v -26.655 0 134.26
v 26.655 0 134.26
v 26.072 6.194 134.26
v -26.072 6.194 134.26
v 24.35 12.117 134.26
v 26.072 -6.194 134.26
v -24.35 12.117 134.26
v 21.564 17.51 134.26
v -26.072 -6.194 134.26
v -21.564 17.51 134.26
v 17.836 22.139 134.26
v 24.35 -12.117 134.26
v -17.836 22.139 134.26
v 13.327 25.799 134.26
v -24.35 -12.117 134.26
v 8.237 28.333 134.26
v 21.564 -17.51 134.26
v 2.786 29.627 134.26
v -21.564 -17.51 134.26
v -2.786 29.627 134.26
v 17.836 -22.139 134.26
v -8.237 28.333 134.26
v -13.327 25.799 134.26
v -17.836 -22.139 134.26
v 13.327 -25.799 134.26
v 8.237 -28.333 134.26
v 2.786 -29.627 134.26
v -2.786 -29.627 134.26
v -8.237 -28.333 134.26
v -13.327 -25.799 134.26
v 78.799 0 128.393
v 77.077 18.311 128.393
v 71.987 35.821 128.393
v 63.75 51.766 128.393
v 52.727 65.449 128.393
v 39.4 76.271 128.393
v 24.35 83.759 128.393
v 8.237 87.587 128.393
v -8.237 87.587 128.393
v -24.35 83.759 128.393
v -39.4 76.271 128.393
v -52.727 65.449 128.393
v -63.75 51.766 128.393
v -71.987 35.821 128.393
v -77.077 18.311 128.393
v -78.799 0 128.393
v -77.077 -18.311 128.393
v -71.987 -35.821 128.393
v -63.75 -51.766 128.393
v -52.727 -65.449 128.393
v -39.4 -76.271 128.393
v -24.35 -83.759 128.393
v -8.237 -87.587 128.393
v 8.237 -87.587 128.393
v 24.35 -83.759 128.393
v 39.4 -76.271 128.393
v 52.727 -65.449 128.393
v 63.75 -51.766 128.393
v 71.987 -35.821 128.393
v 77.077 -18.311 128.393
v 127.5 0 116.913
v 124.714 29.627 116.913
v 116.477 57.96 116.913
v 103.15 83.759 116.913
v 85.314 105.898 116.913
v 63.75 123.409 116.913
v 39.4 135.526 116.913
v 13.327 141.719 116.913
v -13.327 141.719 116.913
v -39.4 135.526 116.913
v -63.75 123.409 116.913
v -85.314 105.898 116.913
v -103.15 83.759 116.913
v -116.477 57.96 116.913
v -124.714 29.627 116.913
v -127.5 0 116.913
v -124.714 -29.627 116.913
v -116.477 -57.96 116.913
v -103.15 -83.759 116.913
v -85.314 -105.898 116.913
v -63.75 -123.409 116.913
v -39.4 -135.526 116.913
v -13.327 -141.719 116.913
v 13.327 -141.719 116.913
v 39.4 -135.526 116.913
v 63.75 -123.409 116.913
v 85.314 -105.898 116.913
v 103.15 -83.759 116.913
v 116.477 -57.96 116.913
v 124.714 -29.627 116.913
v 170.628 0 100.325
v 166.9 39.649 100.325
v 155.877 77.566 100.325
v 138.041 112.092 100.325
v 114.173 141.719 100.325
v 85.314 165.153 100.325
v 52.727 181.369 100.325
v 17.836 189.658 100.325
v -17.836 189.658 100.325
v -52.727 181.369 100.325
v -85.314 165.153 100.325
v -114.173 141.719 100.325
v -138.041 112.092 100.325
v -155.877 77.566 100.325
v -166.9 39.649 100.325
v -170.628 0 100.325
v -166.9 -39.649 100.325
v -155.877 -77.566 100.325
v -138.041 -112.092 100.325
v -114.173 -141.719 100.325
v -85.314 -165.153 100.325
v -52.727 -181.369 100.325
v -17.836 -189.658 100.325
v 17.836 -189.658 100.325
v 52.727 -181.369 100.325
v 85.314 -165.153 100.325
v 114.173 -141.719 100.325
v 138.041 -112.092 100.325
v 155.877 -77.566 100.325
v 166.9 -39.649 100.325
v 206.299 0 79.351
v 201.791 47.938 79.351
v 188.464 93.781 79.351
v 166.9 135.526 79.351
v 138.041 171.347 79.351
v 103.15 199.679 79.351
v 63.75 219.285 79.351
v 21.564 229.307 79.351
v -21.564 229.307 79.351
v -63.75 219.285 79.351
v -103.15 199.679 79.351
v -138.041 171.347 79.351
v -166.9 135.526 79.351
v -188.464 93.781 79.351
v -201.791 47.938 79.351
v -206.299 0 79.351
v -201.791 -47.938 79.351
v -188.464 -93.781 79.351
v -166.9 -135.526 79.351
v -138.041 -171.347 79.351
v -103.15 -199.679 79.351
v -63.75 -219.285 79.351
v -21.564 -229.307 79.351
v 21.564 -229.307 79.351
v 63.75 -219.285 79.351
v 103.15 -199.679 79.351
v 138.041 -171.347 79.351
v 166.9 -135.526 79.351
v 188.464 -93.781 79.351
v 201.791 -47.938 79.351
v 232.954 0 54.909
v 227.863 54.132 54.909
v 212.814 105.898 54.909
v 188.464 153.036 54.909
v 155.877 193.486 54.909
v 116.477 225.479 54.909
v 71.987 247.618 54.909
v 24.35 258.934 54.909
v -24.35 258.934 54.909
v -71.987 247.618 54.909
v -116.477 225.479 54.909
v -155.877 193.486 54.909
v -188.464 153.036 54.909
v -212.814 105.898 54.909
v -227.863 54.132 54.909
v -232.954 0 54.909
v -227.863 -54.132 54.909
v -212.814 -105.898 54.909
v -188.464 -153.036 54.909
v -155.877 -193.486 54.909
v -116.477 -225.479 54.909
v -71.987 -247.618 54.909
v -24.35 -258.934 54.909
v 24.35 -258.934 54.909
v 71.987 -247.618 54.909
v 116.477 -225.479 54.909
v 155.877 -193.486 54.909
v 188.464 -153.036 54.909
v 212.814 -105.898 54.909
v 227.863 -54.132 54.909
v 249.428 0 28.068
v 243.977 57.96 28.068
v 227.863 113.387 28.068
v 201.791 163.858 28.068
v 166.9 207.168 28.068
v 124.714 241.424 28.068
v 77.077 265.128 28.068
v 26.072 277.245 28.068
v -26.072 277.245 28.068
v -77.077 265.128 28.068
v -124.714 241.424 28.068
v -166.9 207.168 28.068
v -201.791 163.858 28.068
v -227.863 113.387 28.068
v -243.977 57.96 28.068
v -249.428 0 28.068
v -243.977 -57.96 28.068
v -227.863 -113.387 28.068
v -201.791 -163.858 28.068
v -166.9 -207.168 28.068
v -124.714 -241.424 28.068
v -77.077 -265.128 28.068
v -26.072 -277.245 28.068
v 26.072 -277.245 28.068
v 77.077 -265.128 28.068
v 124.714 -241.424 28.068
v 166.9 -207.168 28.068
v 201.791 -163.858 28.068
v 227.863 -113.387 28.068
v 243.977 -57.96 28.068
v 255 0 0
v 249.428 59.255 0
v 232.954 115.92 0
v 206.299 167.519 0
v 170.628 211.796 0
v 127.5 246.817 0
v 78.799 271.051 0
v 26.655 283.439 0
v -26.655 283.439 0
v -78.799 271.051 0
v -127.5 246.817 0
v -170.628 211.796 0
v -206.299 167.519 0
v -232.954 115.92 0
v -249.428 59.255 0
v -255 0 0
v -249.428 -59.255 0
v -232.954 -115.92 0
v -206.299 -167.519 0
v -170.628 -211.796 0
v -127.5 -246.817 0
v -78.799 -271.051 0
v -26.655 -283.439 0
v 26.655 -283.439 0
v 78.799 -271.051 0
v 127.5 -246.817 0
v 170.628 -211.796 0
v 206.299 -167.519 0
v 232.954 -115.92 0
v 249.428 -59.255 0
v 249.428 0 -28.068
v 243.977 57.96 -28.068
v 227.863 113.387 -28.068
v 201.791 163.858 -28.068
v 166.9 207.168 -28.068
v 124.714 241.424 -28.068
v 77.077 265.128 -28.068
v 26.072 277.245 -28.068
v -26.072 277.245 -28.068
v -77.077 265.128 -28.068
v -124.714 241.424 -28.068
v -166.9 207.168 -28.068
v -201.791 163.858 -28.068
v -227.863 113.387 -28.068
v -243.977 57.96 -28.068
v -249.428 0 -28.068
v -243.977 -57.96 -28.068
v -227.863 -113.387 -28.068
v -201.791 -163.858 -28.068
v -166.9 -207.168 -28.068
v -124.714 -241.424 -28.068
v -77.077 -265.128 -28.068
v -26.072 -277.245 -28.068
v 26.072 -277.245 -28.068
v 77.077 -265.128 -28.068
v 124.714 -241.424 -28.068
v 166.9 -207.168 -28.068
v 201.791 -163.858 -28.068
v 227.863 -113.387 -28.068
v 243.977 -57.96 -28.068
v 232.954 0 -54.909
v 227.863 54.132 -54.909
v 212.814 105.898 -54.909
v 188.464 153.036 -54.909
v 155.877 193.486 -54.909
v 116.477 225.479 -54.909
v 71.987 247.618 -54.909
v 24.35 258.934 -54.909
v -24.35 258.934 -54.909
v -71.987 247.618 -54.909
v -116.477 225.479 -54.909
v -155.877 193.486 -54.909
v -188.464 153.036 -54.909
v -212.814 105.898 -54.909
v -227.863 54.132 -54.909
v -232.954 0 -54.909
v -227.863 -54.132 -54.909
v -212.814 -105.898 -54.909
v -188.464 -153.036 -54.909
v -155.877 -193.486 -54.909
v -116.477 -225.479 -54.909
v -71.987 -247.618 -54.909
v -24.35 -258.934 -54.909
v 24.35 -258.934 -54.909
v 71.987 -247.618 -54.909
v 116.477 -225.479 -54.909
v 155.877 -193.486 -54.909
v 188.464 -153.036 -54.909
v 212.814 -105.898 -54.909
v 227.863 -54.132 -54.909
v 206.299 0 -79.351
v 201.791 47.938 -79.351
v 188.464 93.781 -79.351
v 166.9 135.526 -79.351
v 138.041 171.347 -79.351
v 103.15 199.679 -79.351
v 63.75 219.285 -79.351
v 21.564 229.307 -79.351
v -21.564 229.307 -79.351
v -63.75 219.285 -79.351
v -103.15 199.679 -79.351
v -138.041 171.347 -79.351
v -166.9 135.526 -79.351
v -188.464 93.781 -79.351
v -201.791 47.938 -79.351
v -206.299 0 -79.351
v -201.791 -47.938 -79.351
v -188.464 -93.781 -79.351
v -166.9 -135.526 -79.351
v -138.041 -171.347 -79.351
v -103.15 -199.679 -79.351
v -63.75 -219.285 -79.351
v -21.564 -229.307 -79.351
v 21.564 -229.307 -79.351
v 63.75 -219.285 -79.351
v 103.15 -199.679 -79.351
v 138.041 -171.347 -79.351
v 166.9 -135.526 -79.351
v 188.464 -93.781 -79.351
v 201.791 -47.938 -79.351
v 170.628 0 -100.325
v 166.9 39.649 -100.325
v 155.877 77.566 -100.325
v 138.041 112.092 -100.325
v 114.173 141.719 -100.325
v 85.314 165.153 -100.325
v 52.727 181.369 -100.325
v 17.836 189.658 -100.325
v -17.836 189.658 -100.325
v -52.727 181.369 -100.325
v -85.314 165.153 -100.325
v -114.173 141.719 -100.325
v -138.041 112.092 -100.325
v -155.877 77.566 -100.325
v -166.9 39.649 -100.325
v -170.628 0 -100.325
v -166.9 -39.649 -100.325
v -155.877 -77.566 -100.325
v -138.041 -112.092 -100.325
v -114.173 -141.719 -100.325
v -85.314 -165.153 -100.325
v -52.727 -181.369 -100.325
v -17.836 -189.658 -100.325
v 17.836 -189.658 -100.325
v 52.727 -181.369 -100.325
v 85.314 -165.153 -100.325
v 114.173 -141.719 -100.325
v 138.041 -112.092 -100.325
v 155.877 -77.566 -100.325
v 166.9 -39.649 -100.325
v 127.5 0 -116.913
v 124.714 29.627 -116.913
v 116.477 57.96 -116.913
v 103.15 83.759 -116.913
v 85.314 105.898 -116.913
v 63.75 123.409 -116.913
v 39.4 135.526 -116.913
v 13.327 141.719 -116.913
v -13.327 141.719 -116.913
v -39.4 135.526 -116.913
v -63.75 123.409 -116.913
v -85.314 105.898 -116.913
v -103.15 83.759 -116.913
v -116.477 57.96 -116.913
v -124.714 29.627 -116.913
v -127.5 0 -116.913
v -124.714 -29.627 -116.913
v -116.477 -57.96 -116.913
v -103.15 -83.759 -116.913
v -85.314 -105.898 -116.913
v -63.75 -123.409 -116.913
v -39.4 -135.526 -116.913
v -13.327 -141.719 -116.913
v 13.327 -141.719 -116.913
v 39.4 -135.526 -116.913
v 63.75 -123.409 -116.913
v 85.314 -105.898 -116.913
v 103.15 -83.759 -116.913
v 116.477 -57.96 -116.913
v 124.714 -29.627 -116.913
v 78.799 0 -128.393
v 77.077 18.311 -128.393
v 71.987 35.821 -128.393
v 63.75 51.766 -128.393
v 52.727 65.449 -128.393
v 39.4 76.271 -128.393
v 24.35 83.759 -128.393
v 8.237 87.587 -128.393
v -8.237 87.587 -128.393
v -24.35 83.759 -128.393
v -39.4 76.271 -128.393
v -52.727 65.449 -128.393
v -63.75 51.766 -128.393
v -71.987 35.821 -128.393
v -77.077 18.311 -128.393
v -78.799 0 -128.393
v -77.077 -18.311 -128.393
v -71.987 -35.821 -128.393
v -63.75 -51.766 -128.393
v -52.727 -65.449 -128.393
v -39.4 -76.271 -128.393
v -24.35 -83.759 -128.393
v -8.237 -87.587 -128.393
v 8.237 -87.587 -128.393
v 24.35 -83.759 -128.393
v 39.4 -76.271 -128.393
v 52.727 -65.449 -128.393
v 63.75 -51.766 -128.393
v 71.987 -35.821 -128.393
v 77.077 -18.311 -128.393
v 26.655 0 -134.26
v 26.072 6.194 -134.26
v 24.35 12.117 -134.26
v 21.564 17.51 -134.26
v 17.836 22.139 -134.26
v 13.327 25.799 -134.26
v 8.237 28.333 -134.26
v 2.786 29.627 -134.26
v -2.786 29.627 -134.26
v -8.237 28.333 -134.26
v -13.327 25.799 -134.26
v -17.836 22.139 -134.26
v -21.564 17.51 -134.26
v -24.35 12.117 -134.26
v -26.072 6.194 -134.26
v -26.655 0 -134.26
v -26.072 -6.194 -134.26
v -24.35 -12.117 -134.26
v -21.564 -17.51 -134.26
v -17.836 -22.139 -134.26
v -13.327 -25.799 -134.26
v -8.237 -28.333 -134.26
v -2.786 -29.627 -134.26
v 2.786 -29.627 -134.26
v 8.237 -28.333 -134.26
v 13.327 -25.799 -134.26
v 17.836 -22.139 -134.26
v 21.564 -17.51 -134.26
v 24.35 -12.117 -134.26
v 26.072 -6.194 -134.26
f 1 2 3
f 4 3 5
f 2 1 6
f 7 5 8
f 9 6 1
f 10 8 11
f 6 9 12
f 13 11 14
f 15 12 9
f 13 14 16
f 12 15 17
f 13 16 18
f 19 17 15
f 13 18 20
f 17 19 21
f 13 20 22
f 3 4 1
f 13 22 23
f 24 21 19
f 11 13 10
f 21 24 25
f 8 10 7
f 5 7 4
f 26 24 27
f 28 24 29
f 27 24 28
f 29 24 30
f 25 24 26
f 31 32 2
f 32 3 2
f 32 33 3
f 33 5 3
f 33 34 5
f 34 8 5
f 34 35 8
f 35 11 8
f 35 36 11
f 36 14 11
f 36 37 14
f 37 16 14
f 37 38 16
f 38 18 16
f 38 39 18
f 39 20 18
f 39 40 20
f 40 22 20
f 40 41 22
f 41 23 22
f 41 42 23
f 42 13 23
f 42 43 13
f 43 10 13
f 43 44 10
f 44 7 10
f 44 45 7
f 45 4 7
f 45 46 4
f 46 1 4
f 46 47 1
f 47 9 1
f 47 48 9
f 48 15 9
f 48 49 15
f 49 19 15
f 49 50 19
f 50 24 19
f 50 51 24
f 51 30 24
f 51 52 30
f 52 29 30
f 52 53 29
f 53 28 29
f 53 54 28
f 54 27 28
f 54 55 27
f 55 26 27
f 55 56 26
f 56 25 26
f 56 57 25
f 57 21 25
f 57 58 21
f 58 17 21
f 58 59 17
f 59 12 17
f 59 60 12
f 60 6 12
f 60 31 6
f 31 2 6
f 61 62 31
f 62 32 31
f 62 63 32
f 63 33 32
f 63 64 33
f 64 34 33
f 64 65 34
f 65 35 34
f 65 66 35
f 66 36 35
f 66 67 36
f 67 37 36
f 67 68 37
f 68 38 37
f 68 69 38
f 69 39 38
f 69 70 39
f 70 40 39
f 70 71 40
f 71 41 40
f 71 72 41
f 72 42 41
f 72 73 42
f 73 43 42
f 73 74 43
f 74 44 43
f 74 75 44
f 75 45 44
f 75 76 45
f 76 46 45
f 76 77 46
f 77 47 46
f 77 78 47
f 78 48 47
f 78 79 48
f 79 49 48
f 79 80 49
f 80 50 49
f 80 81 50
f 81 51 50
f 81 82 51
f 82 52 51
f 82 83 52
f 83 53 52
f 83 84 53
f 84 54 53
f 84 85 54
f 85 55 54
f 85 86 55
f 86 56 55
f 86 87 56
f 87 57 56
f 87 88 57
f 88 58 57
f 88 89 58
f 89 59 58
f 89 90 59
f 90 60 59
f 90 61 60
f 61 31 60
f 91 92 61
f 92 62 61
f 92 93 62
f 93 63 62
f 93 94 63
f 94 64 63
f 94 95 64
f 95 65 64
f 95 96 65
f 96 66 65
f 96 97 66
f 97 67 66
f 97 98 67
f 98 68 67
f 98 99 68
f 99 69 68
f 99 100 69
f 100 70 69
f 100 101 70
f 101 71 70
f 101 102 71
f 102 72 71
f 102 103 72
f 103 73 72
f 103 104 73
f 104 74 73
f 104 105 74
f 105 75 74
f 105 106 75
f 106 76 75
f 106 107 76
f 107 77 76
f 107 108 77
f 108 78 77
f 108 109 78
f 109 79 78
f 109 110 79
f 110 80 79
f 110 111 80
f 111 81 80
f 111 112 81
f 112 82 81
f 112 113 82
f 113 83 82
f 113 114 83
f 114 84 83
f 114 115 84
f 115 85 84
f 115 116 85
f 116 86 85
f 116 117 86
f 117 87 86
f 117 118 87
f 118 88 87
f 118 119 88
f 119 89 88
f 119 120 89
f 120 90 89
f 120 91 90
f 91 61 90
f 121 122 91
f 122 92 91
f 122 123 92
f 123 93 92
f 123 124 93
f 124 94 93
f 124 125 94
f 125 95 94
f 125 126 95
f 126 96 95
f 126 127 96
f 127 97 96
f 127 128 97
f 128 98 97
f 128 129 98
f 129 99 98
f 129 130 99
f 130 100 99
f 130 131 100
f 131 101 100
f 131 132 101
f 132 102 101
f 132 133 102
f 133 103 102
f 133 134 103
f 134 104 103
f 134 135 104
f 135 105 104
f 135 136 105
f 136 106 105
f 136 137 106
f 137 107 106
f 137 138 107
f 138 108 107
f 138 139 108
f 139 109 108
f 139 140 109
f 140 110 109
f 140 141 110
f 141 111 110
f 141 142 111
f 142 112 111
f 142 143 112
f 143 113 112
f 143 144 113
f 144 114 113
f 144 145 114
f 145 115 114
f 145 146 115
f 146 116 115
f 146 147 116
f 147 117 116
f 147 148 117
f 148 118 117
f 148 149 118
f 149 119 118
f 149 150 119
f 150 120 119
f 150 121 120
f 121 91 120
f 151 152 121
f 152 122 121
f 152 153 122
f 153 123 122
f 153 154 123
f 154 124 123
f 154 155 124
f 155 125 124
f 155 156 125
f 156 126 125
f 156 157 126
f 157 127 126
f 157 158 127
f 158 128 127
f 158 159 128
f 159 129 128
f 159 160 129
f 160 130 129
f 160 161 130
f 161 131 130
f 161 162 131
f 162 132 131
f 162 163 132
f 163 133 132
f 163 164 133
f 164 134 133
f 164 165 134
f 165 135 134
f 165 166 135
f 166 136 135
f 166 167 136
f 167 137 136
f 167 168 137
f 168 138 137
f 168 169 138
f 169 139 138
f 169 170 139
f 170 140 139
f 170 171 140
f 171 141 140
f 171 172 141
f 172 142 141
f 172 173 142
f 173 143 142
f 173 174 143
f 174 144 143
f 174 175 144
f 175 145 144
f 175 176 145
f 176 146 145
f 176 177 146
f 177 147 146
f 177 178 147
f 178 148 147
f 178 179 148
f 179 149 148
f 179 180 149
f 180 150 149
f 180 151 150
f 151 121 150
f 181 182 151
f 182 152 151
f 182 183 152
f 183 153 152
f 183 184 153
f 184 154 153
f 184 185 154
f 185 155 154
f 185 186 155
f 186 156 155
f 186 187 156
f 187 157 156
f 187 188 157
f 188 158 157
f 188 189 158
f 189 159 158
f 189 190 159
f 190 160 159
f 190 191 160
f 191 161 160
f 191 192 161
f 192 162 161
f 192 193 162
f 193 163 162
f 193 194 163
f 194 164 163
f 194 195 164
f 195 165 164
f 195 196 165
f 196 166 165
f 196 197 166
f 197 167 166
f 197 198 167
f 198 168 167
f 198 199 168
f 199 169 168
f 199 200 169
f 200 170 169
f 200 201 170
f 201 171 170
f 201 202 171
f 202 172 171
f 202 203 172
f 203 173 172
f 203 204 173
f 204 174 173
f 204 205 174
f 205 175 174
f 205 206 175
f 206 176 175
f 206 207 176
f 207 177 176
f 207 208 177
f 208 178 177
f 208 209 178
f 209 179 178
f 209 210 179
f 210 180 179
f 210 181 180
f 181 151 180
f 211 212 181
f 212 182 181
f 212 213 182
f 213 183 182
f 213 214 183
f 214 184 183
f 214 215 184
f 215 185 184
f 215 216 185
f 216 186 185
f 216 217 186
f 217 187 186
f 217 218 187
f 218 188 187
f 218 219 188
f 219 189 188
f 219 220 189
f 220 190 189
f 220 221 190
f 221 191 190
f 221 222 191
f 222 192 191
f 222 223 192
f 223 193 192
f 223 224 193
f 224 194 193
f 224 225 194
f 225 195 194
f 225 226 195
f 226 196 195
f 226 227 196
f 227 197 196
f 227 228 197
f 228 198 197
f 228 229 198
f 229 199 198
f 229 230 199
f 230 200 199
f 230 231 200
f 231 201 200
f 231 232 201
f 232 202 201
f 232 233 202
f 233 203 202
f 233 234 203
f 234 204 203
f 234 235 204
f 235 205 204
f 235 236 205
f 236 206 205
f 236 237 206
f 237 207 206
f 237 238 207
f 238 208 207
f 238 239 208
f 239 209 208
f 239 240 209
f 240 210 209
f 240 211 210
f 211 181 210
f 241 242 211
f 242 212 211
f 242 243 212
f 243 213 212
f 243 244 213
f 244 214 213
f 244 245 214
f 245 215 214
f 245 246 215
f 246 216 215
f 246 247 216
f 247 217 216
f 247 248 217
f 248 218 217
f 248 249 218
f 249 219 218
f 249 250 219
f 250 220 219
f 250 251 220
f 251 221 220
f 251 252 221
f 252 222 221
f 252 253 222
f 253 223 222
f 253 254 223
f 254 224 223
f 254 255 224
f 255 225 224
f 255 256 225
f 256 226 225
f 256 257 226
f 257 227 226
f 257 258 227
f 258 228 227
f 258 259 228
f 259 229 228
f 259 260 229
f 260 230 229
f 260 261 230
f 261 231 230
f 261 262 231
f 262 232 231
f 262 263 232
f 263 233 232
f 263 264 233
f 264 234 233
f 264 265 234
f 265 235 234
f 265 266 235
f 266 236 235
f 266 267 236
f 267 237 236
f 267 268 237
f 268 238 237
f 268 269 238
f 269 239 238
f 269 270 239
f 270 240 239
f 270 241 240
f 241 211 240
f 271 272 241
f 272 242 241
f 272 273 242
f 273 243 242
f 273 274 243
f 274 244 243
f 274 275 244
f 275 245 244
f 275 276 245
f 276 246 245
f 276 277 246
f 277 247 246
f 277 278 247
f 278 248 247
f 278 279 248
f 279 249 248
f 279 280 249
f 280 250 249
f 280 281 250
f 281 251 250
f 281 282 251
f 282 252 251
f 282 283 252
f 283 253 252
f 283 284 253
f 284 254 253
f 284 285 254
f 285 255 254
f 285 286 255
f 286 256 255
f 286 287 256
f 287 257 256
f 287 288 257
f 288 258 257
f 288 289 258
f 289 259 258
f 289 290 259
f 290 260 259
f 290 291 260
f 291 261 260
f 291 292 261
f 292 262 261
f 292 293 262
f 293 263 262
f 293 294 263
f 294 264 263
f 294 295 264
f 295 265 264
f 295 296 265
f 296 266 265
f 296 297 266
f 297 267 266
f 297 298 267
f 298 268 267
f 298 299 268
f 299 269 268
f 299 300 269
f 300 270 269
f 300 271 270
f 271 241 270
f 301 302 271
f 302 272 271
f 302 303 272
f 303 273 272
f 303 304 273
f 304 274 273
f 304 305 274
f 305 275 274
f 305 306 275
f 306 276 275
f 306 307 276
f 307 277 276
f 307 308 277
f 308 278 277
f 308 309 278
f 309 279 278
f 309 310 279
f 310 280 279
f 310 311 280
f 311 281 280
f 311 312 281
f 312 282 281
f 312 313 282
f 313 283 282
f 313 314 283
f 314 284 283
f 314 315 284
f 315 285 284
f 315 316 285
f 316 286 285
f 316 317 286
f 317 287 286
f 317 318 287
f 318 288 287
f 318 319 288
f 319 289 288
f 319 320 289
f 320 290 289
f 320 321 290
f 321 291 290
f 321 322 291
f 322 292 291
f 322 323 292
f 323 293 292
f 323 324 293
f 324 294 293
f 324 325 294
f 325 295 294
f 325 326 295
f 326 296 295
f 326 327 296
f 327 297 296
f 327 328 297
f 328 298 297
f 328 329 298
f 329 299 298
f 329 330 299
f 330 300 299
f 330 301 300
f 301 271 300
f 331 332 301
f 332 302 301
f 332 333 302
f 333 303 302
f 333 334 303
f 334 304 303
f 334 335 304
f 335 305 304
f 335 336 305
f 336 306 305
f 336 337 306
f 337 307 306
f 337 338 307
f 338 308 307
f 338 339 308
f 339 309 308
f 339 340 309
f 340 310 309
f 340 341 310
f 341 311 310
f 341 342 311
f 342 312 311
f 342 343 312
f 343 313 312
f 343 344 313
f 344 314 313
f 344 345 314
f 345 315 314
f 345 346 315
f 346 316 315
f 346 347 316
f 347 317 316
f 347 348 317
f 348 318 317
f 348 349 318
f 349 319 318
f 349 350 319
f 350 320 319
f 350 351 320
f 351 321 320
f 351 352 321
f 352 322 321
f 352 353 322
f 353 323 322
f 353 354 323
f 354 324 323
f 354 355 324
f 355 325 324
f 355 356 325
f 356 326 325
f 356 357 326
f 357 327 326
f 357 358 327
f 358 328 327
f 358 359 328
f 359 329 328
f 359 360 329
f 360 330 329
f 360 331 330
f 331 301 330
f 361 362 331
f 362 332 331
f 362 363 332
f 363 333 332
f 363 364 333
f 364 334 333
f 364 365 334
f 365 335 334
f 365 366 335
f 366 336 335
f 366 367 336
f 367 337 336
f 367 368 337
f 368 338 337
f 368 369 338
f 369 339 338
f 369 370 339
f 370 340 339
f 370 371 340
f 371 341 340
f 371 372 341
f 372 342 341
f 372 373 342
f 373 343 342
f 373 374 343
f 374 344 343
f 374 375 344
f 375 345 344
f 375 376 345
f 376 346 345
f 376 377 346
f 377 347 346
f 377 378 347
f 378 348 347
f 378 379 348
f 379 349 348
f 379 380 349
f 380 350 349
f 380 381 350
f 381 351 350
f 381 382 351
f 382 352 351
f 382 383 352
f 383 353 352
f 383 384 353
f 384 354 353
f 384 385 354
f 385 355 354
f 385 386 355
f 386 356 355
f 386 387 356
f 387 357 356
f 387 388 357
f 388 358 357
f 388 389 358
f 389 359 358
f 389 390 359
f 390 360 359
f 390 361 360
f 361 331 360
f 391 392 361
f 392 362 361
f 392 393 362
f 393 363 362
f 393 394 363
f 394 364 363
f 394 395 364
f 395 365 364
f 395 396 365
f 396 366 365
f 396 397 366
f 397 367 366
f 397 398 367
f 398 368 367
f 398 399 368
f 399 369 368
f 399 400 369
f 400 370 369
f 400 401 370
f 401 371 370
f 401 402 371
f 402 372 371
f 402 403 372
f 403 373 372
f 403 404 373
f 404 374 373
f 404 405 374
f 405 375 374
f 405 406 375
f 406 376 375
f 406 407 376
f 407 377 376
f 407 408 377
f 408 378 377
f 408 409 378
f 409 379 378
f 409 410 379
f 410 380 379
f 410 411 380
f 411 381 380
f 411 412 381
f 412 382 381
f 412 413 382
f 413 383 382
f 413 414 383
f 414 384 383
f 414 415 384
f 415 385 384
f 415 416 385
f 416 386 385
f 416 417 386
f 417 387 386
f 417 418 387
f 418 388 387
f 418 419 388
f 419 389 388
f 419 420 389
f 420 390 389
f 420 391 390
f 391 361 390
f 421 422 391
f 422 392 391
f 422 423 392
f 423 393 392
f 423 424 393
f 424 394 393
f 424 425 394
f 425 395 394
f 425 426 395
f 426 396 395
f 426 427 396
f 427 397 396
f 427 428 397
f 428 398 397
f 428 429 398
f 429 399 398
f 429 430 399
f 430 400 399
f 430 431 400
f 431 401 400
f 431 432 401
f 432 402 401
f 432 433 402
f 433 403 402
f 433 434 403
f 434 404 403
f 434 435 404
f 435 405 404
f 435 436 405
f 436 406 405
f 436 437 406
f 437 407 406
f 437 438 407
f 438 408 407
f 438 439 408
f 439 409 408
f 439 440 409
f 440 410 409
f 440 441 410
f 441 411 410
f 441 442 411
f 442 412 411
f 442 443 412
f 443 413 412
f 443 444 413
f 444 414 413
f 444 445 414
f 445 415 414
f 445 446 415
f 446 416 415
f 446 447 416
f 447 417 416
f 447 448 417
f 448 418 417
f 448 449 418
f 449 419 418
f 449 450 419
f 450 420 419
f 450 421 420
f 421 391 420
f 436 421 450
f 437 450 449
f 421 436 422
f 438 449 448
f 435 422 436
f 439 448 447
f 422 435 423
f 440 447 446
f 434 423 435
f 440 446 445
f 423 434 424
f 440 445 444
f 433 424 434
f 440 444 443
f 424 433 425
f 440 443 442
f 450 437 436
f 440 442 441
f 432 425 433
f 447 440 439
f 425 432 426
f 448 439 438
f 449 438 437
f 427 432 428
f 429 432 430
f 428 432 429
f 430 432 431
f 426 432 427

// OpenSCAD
// Generated by SolidPython 1.0.1 on 2020-07-29 00:46:53


scale(v = [17, 19, 9]) {
	sphere(r = 15);
}
/***********************************************
*********      SolidPython code:      **********
************************************************
 
# import packages: SolidPython
from solid import *
from solid.utils import *
from itertools import chain, combinations, permutations


class Resize:

    def __init__(self, scad_file):
        self.scad_file = scad_file
        #self.scad_file = import_scad(scad_file)
        # cone/cylinder param:
        self.r1 = 0
        self.r2 = 0
        self.h = 0
        # rectangular prism param:
        self.w = 0
        self.l = 0
        # ellipse param:
        self.r = 0

    # import OpenScad code (file name corresponds to shape)


    # classify shape + parameters
    def assign(self, param1, param2, param3):
        if self.scad_file == 'cone.scad':
            self.r1 = param1
            self.r2 = param2
            self.h = param3
        elif self.scad_file == 'cylinder.scad':
            self.r1 = param1
            self.r2 = param2
            self.h = param3
        elif self.scad_file == 'rectangularPrism.scad':
            self.h = param1
            self.l = param2
            self.w = param3
        else:
            self.r = param1
            self.h = param2

    # resize parameters
    def iterate(self):
        x = range(3, 20, 2)
        i = 1
        if self.scad_file == 'cone.scad':
            tempList = list(permutations(x, 2))
            for temp in tempList:
                param1 = temp[0]
                param2 = temp[1]
                filepath = 'produced_scad_files/' + 'cone' + str(param1) + '_' + str(param2) + '_' + '.scad'
                scad_render_to_file(cylinder(h=param1, r1=param2, r2=0), filepath)

        elif self.scad_file == 'cylinder.scad':
            tempList = list(permutations(x, 3))
            for temp in tempList:
                param1 = temp[0]
                param2 = temp[1]
                filepath = 'produced_scad_files/' + 'cylinder' + str(param1) + '_' + str(param2) + '_' + '.scad'
                scad_render_to_file(cylinder(h=param1, r1=param2, r2=param2), filepath)

        elif self.scad_file == 'rectangularPrism.scad':
            tempList = list(permutations(x, 3))
            for temp in tempList:
                param1 = temp[0]
                param2 = temp[1]
                param3 = temp[2]
                filepath = 'produced_scad_files/' + 'rectangularPrism' + str(param1) + '_' + str(param2) + '_' + str(
                    param3) + '.scad'
                scad_render_to_file(cube(size=(param1, param2, param3)), filepath)

        elif self.scad_file == 'ellipse.scad':
            tempList = list(permutations(x, 4))
            for temp in tempList:
                param1 = temp[0]
                param2 = temp[1]
                param3 = temp[2]
                param4 = temp[3]
                filepath = 'produced_scad_files/' + 'ellipse' + str(param1) + '_' + str(param2) + '_' + str(param3) + '_' + str(param4) + '.scad'
                scad_render_to_file(scale([param1, param2, param3])(sphere(r=param4)), filepath)

    def render_to_scadfile(self):
        scad_render_to_file(scad, 'example.scad') 
 
************************************************/
